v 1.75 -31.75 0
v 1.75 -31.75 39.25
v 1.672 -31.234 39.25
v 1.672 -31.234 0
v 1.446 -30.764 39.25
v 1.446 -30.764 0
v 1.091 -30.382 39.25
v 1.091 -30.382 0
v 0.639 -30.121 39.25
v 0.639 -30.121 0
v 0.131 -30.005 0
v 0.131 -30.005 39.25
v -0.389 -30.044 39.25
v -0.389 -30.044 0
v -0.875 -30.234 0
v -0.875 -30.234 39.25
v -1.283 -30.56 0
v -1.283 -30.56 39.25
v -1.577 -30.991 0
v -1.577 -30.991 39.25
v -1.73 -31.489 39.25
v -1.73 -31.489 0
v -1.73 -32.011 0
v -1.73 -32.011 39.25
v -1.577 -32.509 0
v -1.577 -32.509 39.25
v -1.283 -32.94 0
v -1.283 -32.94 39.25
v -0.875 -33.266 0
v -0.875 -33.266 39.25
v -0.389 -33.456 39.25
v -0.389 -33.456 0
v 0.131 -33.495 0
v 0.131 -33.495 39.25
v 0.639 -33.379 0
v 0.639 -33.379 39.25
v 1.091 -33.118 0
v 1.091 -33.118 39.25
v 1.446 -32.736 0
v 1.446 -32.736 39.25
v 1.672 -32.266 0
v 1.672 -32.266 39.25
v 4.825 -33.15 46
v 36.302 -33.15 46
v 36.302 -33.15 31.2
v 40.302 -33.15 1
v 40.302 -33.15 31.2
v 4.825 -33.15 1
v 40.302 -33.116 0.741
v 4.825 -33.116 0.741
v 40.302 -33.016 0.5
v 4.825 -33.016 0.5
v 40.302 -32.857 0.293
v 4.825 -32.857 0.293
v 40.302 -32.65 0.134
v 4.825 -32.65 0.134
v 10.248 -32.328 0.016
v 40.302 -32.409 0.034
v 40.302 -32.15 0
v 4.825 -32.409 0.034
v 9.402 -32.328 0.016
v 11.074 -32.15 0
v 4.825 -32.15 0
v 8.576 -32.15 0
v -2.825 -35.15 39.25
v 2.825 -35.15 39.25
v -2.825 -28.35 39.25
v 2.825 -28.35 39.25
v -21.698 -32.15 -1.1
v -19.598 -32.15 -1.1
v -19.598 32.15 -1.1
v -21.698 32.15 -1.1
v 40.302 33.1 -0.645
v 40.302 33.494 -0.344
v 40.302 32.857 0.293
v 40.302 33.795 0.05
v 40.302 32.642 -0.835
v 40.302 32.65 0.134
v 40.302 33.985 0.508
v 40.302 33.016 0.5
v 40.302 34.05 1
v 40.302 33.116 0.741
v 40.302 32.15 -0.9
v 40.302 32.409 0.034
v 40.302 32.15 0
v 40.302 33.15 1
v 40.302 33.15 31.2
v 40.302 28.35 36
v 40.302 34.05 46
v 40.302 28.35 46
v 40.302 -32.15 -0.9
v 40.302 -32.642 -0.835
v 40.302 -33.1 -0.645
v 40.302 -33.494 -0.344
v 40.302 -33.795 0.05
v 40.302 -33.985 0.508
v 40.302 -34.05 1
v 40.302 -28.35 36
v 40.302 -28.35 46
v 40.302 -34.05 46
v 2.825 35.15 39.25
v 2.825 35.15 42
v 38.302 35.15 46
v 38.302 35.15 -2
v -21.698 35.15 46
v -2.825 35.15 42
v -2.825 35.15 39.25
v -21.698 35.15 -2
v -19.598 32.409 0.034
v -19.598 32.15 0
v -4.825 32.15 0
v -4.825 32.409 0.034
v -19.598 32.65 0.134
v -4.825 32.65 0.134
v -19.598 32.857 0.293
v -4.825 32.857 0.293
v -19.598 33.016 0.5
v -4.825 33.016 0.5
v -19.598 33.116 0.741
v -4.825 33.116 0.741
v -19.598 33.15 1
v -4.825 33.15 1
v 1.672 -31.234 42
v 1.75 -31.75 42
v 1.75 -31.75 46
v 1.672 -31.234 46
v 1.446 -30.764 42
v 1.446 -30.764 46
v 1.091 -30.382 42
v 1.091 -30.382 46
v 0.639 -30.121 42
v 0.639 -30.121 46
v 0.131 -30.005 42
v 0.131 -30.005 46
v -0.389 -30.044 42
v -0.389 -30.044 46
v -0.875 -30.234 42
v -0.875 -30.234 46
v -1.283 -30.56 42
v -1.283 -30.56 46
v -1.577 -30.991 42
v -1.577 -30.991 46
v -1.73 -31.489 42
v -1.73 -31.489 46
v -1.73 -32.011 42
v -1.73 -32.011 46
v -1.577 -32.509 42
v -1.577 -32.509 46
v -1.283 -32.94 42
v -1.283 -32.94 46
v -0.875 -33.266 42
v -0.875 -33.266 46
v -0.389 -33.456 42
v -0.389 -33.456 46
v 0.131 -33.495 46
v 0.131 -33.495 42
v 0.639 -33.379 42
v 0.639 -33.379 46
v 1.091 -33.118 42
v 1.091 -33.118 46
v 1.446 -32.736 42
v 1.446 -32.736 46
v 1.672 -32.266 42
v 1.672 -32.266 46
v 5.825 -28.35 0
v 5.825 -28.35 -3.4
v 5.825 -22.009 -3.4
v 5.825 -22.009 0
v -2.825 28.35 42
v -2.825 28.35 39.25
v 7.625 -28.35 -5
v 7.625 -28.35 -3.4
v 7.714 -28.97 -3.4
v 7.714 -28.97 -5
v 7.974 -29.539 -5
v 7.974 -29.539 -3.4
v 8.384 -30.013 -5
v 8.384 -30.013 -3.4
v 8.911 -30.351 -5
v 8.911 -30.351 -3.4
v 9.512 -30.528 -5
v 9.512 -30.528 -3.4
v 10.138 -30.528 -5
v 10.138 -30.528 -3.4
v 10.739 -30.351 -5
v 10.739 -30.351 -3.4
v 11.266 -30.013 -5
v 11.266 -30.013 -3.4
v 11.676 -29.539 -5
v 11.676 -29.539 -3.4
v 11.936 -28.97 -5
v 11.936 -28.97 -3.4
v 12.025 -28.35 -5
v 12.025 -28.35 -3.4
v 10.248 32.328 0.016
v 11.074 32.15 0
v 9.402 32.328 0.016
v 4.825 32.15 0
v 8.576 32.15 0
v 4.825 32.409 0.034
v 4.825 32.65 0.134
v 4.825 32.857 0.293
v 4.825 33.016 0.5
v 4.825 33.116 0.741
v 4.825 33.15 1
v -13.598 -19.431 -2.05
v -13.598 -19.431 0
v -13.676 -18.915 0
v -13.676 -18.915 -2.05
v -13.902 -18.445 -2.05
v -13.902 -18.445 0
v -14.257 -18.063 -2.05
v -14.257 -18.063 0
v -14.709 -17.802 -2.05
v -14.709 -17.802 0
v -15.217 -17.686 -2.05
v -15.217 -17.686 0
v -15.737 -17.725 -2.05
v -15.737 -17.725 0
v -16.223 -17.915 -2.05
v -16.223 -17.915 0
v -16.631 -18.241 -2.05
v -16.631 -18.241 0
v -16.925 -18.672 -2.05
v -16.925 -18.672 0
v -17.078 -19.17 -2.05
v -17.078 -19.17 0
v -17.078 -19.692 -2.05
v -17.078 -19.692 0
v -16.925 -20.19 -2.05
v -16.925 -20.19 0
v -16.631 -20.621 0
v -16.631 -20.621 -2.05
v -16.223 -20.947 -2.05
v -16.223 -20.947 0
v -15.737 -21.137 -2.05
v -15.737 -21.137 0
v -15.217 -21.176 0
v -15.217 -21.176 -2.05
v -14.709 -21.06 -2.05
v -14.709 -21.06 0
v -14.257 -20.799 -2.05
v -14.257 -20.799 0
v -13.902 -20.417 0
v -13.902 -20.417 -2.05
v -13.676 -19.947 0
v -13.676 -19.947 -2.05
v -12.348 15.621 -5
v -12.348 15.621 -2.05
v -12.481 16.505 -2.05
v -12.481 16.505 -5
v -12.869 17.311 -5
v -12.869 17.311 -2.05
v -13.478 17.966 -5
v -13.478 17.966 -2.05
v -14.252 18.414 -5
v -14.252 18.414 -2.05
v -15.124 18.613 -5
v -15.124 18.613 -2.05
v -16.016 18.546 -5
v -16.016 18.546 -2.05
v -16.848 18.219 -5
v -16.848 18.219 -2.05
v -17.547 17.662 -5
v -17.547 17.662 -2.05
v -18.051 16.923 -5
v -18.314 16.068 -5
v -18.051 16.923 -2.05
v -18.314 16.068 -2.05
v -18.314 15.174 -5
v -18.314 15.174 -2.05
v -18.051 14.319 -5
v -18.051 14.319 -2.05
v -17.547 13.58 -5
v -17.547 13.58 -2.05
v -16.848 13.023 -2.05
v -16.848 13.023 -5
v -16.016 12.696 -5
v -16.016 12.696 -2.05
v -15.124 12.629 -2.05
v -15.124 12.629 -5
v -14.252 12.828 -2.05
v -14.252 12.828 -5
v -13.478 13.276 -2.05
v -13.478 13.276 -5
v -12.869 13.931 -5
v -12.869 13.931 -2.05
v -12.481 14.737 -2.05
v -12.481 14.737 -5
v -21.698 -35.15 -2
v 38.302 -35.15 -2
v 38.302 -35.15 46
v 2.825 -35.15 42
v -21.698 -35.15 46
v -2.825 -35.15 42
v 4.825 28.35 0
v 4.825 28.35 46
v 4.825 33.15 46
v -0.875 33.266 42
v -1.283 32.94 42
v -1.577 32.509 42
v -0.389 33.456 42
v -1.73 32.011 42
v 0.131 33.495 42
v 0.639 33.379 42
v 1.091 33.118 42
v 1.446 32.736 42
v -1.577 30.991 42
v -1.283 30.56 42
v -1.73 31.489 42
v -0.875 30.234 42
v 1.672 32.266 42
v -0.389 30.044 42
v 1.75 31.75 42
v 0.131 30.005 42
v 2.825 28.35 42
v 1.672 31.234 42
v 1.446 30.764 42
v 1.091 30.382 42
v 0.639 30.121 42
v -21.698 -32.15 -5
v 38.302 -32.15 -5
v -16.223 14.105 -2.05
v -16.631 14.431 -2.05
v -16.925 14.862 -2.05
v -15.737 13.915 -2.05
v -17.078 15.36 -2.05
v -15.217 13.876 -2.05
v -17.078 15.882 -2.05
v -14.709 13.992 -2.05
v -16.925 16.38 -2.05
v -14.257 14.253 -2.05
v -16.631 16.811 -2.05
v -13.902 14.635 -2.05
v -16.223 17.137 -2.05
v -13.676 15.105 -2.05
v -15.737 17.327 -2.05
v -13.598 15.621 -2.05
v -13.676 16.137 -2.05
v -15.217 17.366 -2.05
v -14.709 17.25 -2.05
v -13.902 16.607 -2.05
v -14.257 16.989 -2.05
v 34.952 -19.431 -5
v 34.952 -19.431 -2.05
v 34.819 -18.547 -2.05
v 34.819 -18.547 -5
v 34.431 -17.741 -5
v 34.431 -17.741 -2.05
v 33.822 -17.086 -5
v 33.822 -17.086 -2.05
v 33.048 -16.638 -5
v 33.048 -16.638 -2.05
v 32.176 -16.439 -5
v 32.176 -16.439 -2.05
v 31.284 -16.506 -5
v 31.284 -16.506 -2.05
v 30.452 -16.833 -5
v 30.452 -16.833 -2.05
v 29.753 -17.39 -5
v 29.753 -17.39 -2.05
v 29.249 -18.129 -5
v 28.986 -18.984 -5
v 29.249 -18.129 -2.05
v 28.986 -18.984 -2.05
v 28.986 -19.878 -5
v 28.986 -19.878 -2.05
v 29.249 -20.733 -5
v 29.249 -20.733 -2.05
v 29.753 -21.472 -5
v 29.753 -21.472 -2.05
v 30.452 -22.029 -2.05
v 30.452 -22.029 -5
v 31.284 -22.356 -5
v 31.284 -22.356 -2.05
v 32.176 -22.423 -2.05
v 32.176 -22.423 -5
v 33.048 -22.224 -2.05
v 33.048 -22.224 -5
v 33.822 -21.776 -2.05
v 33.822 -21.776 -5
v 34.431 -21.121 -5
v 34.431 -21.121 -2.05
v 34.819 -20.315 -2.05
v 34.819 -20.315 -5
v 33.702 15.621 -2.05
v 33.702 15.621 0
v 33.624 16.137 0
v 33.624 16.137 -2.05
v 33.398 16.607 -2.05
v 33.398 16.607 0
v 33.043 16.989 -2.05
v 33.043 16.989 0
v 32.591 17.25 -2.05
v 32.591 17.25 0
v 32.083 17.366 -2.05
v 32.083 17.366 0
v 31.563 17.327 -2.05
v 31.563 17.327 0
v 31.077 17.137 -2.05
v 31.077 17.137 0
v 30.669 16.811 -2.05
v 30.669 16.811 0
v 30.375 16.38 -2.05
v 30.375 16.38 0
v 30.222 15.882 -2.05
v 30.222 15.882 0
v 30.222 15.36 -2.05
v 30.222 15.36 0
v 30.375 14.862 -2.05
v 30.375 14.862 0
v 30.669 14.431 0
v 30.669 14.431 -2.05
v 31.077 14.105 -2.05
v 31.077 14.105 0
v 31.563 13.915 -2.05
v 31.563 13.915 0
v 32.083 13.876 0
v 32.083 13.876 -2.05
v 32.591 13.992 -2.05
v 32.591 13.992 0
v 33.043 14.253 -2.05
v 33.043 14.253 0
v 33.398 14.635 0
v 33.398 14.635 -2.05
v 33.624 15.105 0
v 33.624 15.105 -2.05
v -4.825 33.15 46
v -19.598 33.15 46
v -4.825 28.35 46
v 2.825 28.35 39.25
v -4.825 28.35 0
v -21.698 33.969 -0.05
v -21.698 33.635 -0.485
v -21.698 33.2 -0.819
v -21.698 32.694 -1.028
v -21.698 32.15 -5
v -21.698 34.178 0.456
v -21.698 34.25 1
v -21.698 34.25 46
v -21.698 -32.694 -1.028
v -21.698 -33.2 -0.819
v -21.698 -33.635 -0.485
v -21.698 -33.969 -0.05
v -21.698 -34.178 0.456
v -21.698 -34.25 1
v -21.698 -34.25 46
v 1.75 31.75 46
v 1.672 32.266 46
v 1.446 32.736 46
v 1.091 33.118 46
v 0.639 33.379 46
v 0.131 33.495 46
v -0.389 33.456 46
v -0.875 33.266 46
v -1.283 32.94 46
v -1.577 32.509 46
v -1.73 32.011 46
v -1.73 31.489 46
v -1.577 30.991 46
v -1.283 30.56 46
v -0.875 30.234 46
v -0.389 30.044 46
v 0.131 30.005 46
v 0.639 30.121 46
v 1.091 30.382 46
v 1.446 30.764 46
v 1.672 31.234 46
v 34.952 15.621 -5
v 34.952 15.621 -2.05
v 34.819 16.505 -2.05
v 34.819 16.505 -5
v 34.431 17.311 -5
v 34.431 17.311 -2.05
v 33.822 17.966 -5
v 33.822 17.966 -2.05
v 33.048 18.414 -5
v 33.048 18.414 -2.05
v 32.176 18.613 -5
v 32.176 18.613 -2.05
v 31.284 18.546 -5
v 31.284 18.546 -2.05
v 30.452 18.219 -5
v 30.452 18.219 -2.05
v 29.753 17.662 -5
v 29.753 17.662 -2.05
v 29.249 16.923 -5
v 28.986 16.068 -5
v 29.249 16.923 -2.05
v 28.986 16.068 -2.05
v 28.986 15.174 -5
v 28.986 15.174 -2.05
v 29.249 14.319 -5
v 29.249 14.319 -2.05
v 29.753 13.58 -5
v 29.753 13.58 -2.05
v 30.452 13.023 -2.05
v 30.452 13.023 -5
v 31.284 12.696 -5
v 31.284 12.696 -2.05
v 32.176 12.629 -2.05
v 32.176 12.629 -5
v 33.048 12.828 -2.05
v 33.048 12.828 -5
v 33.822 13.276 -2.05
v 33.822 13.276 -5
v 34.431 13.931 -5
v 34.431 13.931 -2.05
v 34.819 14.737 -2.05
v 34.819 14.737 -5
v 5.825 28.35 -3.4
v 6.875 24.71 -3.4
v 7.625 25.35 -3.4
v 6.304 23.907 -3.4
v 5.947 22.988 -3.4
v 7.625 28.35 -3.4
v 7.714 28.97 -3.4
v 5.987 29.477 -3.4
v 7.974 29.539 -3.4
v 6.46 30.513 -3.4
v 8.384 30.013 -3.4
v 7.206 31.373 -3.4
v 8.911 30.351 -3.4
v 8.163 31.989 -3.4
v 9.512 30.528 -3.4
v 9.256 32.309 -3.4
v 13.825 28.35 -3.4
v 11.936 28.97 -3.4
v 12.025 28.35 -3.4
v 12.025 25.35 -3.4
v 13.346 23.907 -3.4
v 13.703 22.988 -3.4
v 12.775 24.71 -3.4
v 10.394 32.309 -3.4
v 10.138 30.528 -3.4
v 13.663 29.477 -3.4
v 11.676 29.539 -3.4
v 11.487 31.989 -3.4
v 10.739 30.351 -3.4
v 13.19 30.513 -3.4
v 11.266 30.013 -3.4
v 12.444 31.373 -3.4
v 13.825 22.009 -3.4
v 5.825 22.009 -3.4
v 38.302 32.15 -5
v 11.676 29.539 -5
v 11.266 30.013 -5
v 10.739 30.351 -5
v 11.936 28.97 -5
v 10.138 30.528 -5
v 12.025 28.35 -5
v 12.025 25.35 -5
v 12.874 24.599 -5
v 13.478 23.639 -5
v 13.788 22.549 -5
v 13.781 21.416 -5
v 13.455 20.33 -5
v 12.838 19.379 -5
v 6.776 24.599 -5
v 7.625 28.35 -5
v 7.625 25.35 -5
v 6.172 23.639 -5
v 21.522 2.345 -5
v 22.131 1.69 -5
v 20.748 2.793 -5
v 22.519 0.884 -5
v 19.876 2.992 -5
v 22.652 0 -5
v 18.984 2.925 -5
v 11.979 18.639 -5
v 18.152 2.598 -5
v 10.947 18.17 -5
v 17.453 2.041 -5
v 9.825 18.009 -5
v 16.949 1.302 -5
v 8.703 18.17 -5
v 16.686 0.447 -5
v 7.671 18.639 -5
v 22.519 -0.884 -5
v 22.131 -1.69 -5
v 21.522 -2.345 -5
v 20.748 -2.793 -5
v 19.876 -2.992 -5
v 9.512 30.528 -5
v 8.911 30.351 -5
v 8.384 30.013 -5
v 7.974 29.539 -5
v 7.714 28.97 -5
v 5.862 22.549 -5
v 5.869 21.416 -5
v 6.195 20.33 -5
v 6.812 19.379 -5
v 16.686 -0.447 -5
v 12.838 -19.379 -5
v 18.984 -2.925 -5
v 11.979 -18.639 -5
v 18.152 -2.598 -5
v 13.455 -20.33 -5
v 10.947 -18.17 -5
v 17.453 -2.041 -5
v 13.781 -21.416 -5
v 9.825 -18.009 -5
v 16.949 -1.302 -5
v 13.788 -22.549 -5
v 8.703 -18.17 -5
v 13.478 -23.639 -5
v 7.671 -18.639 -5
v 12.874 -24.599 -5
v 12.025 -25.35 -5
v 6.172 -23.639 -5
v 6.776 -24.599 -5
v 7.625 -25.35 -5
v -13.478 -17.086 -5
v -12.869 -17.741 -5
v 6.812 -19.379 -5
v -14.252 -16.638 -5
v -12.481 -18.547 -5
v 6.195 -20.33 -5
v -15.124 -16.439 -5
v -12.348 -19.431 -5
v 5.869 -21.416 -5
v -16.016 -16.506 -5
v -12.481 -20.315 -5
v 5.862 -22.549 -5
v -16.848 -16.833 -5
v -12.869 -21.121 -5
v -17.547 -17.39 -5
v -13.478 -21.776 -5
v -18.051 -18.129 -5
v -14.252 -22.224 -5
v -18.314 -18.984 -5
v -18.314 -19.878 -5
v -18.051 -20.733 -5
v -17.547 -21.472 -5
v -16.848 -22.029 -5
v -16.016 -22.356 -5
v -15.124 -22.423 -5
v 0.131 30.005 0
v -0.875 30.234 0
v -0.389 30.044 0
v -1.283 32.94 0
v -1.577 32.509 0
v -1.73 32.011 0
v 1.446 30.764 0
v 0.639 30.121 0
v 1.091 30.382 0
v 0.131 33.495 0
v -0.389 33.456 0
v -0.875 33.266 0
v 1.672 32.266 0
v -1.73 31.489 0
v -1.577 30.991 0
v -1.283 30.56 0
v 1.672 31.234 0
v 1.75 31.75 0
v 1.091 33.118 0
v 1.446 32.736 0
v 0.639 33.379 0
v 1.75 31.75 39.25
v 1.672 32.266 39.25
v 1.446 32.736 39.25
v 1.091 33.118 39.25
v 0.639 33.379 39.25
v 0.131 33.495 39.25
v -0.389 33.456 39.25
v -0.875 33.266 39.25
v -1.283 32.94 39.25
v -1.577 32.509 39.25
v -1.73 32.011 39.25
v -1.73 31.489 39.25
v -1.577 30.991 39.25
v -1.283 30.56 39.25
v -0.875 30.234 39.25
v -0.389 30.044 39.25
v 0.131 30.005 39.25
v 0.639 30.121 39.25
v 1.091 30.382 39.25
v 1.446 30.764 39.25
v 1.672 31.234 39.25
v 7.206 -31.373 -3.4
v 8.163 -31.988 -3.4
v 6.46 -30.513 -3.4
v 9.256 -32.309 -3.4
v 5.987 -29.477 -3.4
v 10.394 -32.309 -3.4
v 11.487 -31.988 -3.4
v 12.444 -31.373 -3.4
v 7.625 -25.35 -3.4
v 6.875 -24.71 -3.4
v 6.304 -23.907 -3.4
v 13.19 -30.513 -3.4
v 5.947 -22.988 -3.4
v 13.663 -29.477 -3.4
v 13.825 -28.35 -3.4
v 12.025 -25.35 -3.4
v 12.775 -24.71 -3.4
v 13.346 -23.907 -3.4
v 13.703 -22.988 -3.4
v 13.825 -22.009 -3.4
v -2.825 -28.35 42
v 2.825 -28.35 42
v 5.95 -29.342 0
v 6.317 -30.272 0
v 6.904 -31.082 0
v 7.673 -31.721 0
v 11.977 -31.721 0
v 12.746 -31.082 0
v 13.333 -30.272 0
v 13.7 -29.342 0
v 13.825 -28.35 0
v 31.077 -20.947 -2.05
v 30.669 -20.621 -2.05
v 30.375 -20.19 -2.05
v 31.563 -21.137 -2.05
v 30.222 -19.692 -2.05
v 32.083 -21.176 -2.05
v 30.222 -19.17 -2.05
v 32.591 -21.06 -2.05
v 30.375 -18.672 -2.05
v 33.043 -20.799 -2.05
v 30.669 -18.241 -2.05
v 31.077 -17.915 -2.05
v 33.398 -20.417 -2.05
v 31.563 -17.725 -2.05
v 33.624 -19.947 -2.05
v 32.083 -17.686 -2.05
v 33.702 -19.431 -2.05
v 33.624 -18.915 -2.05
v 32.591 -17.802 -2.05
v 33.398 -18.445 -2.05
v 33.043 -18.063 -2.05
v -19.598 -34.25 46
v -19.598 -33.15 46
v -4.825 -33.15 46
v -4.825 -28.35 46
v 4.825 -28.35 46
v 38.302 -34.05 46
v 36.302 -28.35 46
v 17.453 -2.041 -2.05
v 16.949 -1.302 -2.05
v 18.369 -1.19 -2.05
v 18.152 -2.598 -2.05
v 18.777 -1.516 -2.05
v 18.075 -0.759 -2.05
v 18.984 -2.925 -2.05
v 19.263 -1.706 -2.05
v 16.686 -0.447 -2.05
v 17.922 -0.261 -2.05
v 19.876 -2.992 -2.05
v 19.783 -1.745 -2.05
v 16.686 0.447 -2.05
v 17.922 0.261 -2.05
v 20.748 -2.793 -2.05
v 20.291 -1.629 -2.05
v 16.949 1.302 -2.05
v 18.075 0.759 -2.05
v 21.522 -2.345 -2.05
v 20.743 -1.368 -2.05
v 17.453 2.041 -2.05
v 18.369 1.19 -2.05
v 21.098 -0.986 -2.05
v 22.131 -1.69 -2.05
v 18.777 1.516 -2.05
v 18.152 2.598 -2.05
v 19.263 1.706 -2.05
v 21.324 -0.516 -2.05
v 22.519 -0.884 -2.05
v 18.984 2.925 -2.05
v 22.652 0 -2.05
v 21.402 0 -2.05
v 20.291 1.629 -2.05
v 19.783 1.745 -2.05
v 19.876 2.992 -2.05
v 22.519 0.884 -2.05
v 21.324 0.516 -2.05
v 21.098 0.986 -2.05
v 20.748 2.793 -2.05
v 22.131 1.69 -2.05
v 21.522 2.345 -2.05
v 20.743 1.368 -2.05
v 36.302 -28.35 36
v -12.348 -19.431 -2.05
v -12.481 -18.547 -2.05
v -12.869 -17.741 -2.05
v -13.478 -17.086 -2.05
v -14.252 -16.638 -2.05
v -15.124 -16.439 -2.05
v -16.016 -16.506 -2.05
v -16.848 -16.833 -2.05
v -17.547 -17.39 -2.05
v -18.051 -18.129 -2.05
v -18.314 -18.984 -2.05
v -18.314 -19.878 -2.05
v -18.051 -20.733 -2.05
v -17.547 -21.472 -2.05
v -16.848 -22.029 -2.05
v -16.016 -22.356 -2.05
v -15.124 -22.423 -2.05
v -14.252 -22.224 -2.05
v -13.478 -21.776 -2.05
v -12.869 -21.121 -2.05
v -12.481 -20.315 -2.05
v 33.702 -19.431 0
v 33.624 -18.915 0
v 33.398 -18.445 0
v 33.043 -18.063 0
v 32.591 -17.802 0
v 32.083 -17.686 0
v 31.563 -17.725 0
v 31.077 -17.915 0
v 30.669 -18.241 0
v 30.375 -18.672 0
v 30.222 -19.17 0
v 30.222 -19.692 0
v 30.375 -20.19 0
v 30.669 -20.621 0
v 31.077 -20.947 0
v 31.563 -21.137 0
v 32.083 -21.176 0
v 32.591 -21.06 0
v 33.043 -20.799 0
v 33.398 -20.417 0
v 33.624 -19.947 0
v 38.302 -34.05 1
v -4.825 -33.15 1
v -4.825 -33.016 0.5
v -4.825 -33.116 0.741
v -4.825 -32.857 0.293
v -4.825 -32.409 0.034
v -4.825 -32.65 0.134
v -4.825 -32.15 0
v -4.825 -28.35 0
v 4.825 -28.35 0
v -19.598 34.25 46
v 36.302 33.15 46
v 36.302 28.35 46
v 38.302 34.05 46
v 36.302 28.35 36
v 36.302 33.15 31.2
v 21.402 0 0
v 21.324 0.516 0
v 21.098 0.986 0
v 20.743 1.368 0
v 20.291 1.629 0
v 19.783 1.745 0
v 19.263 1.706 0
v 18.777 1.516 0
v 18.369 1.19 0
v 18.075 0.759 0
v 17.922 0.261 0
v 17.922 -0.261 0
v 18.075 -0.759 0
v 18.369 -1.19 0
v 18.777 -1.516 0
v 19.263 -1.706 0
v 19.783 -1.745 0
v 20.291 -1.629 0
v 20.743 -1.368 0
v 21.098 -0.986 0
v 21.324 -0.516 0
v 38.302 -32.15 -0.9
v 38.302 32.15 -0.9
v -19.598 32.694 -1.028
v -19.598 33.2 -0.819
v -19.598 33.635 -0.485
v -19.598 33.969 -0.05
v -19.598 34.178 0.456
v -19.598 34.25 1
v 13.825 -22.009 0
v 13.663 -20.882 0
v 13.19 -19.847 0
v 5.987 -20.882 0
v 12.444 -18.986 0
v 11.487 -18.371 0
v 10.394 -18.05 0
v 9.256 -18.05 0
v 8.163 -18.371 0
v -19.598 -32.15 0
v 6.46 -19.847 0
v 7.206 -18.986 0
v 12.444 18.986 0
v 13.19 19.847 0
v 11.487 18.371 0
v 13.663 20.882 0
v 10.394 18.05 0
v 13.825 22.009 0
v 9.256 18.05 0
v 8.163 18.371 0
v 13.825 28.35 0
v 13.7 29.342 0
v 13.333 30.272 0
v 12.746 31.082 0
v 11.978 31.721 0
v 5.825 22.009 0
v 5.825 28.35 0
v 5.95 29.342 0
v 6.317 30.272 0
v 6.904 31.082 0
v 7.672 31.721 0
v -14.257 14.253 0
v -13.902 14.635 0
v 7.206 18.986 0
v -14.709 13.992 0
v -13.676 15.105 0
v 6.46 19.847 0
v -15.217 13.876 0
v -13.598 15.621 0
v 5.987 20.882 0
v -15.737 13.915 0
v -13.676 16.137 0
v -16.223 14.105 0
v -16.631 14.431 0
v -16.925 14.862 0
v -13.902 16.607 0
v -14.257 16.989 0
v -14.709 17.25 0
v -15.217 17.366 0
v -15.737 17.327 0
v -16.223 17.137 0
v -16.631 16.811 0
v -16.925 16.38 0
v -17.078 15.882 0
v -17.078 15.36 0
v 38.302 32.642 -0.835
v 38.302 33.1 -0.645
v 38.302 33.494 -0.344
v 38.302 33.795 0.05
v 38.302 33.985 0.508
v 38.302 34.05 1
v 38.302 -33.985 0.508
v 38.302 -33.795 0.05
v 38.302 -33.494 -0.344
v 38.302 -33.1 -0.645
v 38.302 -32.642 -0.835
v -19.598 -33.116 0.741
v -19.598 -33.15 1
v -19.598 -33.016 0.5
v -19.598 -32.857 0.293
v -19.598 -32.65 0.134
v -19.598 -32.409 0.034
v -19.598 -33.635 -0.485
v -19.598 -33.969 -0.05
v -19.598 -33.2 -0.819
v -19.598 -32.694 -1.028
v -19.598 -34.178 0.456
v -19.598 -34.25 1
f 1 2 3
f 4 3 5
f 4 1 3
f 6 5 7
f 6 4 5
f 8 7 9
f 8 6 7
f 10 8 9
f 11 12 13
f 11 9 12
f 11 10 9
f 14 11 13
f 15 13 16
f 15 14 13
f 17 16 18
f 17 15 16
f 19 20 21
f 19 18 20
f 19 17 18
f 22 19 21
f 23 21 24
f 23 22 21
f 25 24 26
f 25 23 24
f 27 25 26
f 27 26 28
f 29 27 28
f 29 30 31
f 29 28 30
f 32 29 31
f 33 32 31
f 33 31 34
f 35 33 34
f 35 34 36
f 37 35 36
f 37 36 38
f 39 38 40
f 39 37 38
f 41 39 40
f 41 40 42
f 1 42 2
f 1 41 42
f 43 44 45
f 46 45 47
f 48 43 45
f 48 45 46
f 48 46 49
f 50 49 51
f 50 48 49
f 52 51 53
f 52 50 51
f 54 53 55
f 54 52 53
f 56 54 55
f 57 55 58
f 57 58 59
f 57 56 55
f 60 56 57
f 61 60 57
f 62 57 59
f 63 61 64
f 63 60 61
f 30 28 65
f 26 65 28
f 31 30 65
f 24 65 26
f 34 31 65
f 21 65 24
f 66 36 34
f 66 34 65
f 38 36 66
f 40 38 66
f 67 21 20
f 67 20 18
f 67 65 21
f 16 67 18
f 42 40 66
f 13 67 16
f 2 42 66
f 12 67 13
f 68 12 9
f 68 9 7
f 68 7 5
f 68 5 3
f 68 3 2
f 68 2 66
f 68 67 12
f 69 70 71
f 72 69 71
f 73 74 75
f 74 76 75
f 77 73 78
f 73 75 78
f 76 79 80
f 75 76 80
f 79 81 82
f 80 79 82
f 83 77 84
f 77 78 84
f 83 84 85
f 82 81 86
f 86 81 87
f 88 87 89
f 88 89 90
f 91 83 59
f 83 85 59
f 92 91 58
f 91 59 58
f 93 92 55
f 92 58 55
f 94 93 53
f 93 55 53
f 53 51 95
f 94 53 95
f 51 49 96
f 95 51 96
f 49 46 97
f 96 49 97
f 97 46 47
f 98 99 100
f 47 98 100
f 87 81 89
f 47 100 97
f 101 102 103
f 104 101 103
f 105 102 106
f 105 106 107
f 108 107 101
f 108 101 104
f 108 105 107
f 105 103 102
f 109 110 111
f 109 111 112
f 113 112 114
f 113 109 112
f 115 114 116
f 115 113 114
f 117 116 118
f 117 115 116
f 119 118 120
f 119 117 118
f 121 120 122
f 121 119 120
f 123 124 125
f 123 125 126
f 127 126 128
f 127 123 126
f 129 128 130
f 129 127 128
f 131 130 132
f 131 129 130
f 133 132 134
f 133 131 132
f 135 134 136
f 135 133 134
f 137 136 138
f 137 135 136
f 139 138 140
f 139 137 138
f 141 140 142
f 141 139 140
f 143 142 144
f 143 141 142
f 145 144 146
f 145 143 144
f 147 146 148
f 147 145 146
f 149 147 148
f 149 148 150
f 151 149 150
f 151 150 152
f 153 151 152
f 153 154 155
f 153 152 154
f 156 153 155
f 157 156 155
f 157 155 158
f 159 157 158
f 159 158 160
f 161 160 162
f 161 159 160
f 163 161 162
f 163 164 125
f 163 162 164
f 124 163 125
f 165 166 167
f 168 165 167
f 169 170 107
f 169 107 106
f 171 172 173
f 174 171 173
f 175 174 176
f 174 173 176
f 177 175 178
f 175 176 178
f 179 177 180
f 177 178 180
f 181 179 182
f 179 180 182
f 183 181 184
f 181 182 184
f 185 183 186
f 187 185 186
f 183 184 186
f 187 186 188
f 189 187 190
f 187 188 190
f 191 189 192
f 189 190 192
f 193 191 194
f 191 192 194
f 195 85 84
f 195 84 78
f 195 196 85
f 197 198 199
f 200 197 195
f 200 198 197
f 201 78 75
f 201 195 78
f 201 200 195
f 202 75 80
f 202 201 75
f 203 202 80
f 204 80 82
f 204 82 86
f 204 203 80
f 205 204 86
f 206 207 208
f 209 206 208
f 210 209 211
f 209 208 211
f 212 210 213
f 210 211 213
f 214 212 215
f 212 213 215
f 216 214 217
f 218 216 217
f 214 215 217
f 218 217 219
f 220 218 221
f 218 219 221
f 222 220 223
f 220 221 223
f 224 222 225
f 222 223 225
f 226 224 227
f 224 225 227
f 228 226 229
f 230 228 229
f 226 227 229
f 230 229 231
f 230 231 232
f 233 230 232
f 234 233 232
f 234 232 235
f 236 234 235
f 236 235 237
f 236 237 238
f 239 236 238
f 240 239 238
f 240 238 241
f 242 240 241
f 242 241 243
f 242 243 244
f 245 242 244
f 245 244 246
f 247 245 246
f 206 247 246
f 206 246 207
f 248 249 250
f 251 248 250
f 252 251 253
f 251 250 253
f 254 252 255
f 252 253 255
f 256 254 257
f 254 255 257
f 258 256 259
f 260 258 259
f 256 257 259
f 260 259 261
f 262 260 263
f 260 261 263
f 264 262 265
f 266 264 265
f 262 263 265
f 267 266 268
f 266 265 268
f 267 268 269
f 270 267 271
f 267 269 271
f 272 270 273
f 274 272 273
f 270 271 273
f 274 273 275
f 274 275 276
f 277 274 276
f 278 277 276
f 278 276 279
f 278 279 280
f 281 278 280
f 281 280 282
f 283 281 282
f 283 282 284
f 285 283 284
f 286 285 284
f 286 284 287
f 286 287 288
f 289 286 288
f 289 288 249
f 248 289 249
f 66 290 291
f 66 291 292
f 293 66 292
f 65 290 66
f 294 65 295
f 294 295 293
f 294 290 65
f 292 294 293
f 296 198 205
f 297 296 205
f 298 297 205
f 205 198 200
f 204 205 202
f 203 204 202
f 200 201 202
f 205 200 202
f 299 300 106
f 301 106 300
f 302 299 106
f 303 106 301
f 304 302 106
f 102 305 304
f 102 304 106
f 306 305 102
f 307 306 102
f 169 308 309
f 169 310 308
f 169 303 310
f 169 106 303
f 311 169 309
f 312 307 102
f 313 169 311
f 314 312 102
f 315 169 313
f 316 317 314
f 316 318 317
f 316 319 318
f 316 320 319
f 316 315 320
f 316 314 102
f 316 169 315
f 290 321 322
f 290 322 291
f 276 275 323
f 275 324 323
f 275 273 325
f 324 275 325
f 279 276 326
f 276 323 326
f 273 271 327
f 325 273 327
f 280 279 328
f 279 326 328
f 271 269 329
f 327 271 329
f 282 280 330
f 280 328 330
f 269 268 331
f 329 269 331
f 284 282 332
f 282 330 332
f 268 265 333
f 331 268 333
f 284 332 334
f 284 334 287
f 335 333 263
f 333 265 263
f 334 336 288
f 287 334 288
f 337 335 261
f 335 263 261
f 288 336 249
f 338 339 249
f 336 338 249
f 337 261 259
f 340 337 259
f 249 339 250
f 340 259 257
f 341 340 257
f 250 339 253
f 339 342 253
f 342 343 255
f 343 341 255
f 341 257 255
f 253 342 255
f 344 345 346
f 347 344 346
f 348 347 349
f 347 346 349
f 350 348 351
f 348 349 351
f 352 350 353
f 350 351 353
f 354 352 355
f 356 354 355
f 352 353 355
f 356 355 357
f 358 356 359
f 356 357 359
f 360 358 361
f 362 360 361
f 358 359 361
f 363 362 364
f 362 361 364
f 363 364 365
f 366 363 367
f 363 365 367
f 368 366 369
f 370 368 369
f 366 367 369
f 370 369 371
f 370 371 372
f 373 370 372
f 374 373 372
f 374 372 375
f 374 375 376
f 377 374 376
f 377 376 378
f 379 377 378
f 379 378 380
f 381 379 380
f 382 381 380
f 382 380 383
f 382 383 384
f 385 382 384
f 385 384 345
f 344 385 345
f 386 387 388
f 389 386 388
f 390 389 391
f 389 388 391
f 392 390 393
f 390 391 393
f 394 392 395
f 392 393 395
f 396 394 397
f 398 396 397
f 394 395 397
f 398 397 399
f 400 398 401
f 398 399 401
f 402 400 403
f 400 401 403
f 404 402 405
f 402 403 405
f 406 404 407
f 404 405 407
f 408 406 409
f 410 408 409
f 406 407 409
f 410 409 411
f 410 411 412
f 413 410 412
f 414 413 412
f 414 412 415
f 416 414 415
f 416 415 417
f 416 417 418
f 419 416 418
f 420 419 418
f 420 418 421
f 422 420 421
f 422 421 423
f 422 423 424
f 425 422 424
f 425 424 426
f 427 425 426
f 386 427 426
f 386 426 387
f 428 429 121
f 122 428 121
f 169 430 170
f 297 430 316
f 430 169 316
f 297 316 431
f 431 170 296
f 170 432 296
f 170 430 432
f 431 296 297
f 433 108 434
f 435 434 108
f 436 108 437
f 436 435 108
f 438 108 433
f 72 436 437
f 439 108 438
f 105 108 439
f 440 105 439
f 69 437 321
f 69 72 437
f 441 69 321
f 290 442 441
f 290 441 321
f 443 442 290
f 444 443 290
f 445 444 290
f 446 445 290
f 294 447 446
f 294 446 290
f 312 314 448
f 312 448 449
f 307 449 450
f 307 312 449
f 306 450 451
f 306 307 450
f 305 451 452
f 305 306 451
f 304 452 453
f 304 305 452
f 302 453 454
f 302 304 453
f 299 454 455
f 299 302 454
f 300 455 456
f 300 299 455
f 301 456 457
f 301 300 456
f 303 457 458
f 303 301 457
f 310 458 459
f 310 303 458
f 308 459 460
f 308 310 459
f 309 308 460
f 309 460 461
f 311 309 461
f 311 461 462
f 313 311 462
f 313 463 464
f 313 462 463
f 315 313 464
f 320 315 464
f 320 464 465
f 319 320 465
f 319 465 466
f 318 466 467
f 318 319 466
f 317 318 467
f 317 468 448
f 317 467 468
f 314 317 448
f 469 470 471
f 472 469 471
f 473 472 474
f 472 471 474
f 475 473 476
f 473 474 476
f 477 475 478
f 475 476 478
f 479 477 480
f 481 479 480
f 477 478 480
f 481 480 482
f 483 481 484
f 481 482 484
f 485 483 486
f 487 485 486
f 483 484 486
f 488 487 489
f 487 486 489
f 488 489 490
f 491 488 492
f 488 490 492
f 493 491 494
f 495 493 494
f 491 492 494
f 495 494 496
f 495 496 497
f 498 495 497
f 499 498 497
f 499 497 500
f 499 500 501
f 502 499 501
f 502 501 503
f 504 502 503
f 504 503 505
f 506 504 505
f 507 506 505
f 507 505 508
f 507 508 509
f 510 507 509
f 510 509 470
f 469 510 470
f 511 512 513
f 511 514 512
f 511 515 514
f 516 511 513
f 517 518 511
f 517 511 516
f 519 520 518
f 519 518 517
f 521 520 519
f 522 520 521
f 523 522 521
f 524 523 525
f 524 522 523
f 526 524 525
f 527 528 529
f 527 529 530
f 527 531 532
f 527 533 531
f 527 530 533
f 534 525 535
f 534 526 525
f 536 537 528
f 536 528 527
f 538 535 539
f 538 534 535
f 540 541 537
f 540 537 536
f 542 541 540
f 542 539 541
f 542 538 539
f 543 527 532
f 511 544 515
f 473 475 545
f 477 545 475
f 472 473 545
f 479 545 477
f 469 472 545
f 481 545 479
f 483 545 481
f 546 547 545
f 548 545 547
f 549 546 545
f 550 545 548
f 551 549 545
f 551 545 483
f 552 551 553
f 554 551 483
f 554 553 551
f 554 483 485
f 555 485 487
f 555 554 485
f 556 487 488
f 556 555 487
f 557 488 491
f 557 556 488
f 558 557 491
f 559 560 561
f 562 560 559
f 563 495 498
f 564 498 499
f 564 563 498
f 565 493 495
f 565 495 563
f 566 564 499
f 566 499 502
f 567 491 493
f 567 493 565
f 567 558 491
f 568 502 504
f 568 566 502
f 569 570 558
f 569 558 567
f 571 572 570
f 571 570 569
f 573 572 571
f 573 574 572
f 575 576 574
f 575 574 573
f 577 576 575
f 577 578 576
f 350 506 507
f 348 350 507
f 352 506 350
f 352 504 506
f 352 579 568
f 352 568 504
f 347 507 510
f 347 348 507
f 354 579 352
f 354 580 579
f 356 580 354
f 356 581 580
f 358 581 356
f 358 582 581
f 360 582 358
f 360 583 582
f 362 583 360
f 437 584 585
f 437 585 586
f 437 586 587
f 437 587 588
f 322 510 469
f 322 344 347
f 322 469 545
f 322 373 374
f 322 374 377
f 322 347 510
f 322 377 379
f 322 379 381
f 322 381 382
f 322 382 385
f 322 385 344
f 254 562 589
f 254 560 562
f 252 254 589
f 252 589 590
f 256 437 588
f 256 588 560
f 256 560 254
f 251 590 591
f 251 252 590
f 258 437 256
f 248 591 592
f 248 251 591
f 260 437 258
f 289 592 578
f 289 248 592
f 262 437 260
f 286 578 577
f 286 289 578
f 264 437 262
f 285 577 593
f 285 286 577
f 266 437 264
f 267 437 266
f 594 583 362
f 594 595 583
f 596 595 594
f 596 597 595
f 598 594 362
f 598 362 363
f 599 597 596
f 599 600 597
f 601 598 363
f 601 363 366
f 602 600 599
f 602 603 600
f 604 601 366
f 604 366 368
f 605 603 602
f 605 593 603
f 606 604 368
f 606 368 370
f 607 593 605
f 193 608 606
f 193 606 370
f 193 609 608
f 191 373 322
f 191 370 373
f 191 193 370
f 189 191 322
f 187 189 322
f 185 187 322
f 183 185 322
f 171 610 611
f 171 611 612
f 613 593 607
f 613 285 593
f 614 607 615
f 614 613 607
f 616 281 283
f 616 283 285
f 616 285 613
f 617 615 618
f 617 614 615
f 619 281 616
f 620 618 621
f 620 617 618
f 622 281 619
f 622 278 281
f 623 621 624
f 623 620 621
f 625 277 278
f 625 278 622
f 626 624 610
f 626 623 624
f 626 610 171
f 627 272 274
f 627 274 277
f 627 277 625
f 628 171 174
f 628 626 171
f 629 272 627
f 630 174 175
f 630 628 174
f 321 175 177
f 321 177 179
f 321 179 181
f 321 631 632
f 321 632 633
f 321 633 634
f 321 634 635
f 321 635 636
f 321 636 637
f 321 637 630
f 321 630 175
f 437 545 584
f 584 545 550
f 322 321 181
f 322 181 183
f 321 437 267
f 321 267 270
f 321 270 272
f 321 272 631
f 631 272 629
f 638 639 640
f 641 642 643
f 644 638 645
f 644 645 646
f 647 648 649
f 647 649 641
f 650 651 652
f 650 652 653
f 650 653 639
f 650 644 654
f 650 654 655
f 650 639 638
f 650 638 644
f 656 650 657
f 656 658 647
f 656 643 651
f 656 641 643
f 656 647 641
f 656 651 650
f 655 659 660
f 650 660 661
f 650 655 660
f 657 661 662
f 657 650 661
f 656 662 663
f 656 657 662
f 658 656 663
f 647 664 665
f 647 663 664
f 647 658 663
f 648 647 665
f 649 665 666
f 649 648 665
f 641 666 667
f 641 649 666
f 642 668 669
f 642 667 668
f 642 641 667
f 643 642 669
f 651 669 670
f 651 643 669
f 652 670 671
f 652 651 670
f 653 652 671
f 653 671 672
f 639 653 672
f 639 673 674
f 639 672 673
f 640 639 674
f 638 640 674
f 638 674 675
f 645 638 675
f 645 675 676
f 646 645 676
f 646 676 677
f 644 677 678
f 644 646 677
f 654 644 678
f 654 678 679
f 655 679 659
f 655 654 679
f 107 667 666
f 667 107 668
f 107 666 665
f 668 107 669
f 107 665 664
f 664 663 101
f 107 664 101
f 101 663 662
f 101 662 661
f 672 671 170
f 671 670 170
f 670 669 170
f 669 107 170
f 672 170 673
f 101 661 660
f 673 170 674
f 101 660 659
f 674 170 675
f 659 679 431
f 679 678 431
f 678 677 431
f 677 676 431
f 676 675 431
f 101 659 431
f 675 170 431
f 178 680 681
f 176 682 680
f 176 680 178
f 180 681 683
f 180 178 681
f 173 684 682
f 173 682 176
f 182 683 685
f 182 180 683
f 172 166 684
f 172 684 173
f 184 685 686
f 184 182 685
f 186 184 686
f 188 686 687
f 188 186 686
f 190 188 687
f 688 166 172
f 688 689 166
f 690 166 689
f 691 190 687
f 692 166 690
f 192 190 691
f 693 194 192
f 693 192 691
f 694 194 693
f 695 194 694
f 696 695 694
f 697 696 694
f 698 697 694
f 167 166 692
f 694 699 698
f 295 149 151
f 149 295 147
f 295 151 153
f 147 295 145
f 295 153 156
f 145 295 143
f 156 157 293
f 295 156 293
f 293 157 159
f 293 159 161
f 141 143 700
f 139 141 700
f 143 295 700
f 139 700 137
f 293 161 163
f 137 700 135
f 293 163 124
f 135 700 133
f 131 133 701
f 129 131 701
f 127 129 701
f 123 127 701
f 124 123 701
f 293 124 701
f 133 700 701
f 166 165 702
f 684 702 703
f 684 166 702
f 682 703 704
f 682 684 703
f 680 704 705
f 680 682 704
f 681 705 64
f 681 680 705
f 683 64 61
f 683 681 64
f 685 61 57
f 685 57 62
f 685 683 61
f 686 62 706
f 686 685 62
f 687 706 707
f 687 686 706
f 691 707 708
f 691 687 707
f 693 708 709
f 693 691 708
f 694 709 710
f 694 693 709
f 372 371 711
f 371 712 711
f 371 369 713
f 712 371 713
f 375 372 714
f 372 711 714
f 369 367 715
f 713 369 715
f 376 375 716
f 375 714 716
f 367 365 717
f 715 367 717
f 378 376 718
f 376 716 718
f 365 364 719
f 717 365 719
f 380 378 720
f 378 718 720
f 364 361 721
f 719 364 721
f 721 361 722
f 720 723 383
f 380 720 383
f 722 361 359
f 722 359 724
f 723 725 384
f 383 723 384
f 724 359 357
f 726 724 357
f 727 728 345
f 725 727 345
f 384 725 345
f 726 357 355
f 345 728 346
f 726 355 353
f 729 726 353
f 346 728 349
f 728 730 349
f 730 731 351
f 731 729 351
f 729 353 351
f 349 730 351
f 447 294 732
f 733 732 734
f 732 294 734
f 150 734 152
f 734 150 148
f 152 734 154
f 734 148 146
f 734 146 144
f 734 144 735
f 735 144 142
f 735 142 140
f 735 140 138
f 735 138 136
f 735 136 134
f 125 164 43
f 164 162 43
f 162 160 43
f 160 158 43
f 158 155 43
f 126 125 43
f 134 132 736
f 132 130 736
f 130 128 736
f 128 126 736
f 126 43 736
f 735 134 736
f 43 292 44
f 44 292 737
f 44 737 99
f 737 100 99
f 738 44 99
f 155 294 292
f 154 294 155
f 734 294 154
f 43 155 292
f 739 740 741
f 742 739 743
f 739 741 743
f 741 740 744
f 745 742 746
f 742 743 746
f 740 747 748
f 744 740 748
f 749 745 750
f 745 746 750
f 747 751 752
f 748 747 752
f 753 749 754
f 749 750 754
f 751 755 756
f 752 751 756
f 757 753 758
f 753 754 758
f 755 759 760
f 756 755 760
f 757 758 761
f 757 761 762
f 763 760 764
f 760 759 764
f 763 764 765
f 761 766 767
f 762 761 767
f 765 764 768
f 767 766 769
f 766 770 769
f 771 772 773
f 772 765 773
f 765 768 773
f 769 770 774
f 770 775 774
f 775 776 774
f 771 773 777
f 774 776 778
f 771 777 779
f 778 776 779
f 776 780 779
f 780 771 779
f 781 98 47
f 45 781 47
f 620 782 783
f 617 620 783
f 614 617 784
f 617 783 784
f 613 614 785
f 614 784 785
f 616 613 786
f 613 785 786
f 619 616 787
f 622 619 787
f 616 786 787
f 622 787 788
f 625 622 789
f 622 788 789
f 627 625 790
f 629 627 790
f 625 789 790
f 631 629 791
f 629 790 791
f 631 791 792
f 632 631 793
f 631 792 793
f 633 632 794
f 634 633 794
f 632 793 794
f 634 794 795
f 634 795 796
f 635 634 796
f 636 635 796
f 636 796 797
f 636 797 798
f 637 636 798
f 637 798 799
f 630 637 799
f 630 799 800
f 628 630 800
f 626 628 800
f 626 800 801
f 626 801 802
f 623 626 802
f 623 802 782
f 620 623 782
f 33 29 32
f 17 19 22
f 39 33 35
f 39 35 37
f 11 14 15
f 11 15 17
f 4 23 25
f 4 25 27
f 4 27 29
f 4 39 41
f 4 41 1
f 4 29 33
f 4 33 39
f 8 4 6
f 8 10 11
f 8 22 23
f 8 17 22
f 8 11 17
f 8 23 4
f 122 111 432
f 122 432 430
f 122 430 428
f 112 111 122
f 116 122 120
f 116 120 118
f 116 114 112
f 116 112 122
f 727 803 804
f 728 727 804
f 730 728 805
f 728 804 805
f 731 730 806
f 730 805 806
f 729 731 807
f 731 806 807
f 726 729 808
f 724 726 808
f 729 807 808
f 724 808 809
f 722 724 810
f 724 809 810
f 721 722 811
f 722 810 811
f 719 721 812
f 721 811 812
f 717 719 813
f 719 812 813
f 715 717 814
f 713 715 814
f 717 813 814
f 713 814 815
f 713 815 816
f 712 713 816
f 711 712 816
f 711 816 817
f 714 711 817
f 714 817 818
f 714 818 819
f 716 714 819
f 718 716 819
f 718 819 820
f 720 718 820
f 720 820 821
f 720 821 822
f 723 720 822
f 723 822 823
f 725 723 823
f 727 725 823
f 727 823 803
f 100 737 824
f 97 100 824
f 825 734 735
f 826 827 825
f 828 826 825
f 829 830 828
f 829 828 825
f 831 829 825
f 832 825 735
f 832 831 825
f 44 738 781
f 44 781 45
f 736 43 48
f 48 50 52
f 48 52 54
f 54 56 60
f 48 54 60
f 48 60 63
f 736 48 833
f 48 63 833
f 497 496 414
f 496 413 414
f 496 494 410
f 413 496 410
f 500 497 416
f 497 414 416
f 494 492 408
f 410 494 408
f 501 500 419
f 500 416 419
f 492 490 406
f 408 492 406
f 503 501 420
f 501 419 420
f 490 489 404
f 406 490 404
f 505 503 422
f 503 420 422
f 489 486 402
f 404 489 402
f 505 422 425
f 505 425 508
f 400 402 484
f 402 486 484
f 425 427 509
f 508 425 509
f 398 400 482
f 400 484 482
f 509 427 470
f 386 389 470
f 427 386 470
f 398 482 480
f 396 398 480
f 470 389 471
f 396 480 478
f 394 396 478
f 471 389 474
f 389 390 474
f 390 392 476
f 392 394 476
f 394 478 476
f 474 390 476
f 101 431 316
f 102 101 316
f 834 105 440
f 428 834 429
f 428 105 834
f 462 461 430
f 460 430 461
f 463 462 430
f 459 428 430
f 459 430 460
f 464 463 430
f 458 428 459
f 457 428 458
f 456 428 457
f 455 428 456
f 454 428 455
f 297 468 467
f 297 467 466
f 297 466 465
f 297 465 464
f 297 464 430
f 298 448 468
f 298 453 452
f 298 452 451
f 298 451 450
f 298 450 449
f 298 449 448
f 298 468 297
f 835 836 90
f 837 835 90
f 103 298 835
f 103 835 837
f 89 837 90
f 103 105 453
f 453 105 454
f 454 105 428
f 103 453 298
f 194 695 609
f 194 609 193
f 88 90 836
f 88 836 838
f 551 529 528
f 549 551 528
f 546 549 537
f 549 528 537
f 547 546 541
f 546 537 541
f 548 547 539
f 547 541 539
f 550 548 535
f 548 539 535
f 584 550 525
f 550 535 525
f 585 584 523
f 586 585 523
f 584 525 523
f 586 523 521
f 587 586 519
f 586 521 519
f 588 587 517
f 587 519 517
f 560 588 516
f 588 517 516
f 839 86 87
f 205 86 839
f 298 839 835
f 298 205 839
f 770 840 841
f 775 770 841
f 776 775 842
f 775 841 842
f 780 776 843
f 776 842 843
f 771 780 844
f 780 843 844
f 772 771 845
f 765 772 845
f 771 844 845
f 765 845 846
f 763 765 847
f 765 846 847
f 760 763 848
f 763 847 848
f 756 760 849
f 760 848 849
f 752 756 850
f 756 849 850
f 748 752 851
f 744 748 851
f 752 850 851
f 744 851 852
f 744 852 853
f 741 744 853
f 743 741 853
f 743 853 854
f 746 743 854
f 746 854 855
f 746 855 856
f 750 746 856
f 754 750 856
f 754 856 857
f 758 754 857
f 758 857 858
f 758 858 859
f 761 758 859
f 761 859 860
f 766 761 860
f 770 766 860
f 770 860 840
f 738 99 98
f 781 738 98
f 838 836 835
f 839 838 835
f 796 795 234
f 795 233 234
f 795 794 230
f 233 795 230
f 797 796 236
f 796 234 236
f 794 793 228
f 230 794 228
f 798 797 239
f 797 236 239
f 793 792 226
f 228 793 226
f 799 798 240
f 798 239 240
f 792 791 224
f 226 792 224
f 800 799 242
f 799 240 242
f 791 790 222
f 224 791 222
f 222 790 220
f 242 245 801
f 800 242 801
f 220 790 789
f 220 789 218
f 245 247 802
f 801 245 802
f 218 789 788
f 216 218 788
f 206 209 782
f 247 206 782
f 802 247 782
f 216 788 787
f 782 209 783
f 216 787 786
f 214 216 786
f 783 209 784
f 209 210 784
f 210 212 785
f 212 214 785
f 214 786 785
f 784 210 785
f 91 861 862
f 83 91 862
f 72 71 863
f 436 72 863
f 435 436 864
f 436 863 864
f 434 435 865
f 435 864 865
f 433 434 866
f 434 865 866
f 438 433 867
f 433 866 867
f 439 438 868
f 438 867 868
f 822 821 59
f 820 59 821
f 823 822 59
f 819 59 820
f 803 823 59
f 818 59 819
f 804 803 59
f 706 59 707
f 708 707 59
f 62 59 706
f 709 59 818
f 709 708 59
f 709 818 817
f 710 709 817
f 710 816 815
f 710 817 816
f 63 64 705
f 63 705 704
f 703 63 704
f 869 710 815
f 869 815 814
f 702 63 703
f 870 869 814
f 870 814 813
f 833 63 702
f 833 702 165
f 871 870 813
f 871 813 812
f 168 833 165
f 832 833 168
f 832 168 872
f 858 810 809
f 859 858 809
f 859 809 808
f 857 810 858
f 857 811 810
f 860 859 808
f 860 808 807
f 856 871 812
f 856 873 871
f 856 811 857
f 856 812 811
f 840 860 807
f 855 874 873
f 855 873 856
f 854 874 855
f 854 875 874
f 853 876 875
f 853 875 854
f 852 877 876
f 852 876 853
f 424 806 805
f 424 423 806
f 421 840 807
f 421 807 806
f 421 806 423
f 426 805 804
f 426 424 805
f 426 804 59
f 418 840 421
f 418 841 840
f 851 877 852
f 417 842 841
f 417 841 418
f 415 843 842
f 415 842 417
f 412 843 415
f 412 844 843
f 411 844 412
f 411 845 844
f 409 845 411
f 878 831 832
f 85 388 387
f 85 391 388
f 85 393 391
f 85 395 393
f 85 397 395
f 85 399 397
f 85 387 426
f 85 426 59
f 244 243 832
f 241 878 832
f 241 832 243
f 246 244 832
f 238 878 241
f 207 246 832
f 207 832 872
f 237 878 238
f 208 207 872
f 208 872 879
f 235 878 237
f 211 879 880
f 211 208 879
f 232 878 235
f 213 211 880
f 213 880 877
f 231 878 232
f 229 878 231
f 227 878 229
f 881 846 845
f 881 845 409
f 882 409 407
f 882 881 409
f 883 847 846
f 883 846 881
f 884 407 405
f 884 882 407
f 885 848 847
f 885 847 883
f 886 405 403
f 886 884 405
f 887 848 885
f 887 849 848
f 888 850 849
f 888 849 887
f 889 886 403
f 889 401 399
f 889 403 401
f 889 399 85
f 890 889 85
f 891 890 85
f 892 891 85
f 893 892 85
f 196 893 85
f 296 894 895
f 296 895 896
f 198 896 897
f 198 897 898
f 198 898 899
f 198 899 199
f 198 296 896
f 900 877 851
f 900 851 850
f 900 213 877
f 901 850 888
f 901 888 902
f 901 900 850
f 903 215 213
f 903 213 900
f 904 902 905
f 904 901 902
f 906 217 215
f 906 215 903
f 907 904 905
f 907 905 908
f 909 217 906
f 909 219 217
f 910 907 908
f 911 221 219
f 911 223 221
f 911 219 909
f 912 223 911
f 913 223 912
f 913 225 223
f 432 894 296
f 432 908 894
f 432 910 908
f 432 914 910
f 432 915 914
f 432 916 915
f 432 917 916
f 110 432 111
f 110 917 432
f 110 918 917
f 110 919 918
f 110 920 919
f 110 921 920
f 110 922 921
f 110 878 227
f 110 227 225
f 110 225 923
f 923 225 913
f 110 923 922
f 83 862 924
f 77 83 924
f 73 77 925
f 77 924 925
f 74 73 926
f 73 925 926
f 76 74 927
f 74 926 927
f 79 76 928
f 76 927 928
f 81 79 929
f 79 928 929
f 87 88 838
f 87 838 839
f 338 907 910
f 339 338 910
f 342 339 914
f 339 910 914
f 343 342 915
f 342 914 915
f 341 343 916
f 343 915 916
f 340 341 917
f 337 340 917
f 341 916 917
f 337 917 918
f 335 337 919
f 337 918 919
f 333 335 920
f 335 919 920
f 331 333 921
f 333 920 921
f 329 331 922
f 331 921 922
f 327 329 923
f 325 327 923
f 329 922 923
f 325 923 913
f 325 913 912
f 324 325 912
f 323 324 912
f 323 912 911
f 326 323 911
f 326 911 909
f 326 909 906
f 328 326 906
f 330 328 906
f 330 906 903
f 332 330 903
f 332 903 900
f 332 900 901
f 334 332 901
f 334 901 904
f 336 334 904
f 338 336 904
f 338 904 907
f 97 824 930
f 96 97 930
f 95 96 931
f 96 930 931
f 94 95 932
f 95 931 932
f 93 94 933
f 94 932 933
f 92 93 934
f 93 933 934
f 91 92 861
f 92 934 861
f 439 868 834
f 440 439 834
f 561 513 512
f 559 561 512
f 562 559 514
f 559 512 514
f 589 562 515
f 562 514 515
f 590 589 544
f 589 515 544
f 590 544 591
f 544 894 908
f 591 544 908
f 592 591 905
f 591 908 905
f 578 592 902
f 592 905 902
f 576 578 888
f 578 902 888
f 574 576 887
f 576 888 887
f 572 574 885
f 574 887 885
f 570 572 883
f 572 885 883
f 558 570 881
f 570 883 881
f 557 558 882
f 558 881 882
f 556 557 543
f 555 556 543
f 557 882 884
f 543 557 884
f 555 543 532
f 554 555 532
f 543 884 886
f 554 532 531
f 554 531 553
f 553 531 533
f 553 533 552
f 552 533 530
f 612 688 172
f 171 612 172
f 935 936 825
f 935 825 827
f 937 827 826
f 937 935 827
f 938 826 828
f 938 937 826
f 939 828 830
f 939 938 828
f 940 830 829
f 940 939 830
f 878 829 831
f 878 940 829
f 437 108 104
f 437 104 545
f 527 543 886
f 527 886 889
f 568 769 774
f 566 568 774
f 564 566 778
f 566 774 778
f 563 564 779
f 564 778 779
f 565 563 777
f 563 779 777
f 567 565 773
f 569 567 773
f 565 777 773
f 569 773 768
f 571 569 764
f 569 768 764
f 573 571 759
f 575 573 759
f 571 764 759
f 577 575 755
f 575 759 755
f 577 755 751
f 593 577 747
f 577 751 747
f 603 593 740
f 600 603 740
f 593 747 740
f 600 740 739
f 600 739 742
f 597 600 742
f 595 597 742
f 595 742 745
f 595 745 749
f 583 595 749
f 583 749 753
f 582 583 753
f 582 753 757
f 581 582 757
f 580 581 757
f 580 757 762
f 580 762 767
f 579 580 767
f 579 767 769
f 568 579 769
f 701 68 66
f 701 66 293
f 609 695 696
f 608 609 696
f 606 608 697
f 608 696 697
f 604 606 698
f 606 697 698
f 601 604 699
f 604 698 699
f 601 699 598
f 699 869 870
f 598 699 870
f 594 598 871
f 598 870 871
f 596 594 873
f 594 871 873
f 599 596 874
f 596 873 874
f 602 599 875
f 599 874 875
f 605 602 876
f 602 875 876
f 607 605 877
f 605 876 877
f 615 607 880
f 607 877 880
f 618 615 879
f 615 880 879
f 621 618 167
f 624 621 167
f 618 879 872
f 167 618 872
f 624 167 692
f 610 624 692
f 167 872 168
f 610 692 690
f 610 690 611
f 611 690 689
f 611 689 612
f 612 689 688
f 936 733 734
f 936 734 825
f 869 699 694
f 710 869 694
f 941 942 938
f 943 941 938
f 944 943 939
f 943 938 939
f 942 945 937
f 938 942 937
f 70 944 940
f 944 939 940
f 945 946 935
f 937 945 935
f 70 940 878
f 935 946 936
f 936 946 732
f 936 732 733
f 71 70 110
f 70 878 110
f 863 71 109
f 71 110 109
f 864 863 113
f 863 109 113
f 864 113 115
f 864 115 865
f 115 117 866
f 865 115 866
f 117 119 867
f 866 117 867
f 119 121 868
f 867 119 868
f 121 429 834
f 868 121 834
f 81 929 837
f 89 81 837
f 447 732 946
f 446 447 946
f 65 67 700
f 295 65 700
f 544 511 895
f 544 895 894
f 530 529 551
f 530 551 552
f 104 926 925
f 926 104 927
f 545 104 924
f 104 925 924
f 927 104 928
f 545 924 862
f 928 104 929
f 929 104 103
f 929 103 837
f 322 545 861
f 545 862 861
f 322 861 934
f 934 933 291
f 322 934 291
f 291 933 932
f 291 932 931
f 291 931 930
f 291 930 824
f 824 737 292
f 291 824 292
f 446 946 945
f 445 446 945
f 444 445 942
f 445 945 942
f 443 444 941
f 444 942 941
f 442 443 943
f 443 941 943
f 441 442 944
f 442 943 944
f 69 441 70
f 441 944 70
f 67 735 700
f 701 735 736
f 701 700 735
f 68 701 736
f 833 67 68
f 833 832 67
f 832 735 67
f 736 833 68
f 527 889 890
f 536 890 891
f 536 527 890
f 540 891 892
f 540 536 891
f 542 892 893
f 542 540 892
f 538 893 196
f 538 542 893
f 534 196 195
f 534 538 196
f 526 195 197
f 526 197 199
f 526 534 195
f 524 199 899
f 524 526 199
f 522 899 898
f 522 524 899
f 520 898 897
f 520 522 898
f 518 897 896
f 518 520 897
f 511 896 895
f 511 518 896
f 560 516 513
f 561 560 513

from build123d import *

# Parameters (mm, degrees)
PAD018_DEPTH         = 60
POCKET023_DEPTH      = 2.101
SKETCH071_W          = 9.65
SKETCH071_H          = 4.8
PAD020_DEPTH         = 46
SKETCH073_R          = 1.75
POCKET026_DEPTH      = 46.001
SKETCH069_R          = 1.75
POCKET024_DEPTH      = 5.001
SKETCH070_R          = 3
POCKET025_DEPTH      = 2.951
POCKET042_DEPTH      = 49.401
SKETCH072_W          = 5.65
SKETCH072_H          = 2.75
POCKET027_DEPTH      = 35.151
POCKET027_DEPTH_BACK = 35.151
PAD019_DEPTH         = 2
PAD024_DEPTH         = 4


with BuildPart() as part:
    # Sketch066 → Pad018 (new body)
    with BuildSketch(Plane.YZ.offset(-21.698)):
        with BuildLine():
            ThreePointArc((-33.15, 1), (-32.857107, 0.292893), (-32.15, 0))
            Line((-32.15, 0), (32.15, 0))
            ThreePointArc((32.15, 0), (32.857107, 0.292893), (33.15, 1))
            Line((33.15, 46), (33.15, 1))
            Line((33.15, 46), (35.15, 46))
            Line((35.15, 46), (35.15, -2))
            Line((35.15, -2), (32.15, -5))
            Line((32.15, -5), (-32.15, -5))
            Line((-32.15, -5), (-35.15, -2))
            Line((-35.15, -2), (-35.15, 46))
            Line((-35.15, 46), (-33.15, 46))
            Line((-33.15, 46), (-33.15, 1))
        make_face()
    extrude(amount=PAD018_DEPTH)

    # Sketch067 → Pocket023 (cut, through all)
    with BuildSketch(Plane.YZ.offset(-19.598)):
        with BuildLine():
            Line((-34.25, 46), (-34.25, 1))
            ThreePointArc((-34.25, 1), (-33.634924, -0.484924), (-32.15, -1.1))
            Line((-32.15, -1.1), (32.15, -1.1))
            ThreePointArc((32.15, -1.1), (33.634924, -0.484924), (34.25, 1))
            Line((34.25, 1), (34.25, 46))
            Line((34.25, 46), (33.15, 46))
            Line((33.15, 46), (33.15, 1))
            ThreePointArc((32.15, 0), (32.857107, 0.292893), (33.15, 1))
            Line((-32.15, 0), (32.15, 0))
            ThreePointArc((-33.15, 1), (-32.857107, 0.292893), (-32.15, 0))
            Line((-33.15, 46), (-33.15, 1))
            Line((-34.25, 46), (-33.15, 46))
        make_face()
    extrude(amount=-POCKET023_DEPTH, mode=Mode.SUBTRACT)

    # Sketch071 → Pad020 (join)
    with BuildSketch(Plane.XY):
        with Locations((0, 30.75)):
            Rectangle(SKETCH071_W, SKETCH071_H)
        with Locations((0, -30.75)):
            Rectangle(SKETCH071_W, SKETCH071_H)
    extrude(amount=PAD020_DEPTH)

    # Sketch073 → Pocket026 (cut, through all)
    with BuildSketch(Plane.XY):
        with Locations((0, 31.75)):
            Circle(SKETCH073_R)
        with Locations((0, -31.75)):
            Circle(SKETCH073_R)
    extrude(amount=POCKET026_DEPTH, mode=Mode.SUBTRACT)

    # Sketch069 → Pocket024 (cut, through all)
    with BuildSketch(Plane.XY):
        with Locations((-15.348, 15.621)):
            Circle(SKETCH069_R)
        with Locations((31.952, 15.621)):
            Circle(SKETCH069_R)
        with Locations((19.652, 0)):
            Circle(SKETCH069_R)
        with Locations((31.952, -19.431)):
            Circle(SKETCH069_R)
        with Locations((-15.348, -19.431)):
            Circle(SKETCH069_R)
        with BuildLine():
            ThreePointArc((7.625, 25.35), (9.825, 18.009341), (12.025, 25.35))
            Line((12.025, 28.35), (12.025, 25.35))
            ThreePointArc((12.025, 28.35), (9.825, 30.549987), (7.625, 28.35))
            Line((7.625, 28.35), (7.625, 25.35))
        make_face()
        with BuildLine():
            ThreePointArc((12.025, -25.35), (9.825, -18.009341), (7.625, -25.35))
            Line((7.625, -25.35), (7.625, -28.35))
            ThreePointArc((7.625, -28.35), (9.825, -30.549988), (12.025, -28.35))
            Line((12.025, -25.35), (12.025, -28.35))
        make_face()
    extrude(amount=-POCKET024_DEPTH, mode=Mode.SUBTRACT)

    # Sketch070 → Pocket025 (cut, through all)
    with BuildSketch(Plane.XY.offset(-2.05)):
        with Locations((-15.348, 15.621)):
            Circle(SKETCH070_R)
        with Locations((19.652, 0)):
            Circle(SKETCH070_R)
        with Locations((31.952, 15.621)):
            Circle(SKETCH070_R)
        with Locations((-15.348, -19.431)):
            Circle(SKETCH070_R)
        with Locations((31.952, -19.431)):
            Circle(SKETCH070_R)
    extrude(amount=-POCKET025_DEPTH, mode=Mode.SUBTRACT)

    # Sketch → Pocket042 (cut, through all)
    with BuildSketch(Plane.XY.offset(-3.4)):
        with BuildLine():
            ThreePointArc((13.825, 28.35), (9.825, 32.350018), (5.825, 28.35))
            Line((5.825, 28.35), (5.825, 22.009341))
            Line((5.825, 22.009341), (13.825, 22.009341))
            Line((13.825, 22.009341), (13.825, 28.35))
        make_face()
        with BuildLine():
            ThreePointArc((5.825, -28.349974), (9.824987, -32.349956), (13.825, -28.35))
            Line((13.825, -22.009341), (13.825, -28.35))
            Line((5.825, -22.009341), (13.825, -22.009341))
            Line((5.825, -28.349974), (5.825, -22.009341))
        make_face()
    extrude(amount=POCKET042_DEPTH, mode=Mode.SUBTRACT)

    # Sketch072 → Pocket027 (cut, two sides)
    with BuildSketch(Plane.XZ) as pocket027_sk:
        with Locations((0, 40.625)):
            Rectangle(SKETCH072_W, SKETCH072_H)
    extrude(amount=-POCKET027_DEPTH, mode=Mode.SUBTRACT)
    extrude(pocket027_sk.sketch, amount=POCKET027_DEPTH_BACK, mode=Mode.SUBTRACT)

    # Sketch074 → Pad019 (join)
    with BuildSketch(Plane.YZ.offset(38.302)):
        with BuildLine():
            Line((-34.05, 46), (-34.05, 1))
            ThreePointArc((-34.05, 1), (-33.493503, -0.343503), (-32.15, -0.9))
            Line((-32.15, -0.9), (32.15, -0.9))
            ThreePointArc((32.15, -0.9), (33.493503, -0.343503), (34.05, 1))
            Line((34.05, 1), (34.05, 46))
            Line((33.15, 46), (34.05, 46))
            Line((33.15, 1), (33.15, 46))
            ThreePointArc((32.15, 0), (32.857107, 0.292893), (33.15, 1))
            Line((-32.15, 0), (32.15, 0))
            ThreePointArc((-33.15, 1), (-32.857107, 0.292893), (-32.15, 0))
            Line((-33.15, 46), (-33.15, 1))
            Line((-34.05, 46), (-33.15, 46))
        make_face()
    extrude(amount=PAD019_DEPTH)

    # Sketch082 → Pad024 (join)
    with BuildSketch(Plane.YZ.offset(40.302)):
        Polygon((-33.15, 46), (-28.35, 46), (-28.35, 36), (-33.15, 31.2), align=None)
        Polygon((33.15, 46), (28.35, 46), (28.35, 36), (33.15, 31.2), align=None)
    extrude(amount=-PAD024_DEPTH)


solid = part.part
